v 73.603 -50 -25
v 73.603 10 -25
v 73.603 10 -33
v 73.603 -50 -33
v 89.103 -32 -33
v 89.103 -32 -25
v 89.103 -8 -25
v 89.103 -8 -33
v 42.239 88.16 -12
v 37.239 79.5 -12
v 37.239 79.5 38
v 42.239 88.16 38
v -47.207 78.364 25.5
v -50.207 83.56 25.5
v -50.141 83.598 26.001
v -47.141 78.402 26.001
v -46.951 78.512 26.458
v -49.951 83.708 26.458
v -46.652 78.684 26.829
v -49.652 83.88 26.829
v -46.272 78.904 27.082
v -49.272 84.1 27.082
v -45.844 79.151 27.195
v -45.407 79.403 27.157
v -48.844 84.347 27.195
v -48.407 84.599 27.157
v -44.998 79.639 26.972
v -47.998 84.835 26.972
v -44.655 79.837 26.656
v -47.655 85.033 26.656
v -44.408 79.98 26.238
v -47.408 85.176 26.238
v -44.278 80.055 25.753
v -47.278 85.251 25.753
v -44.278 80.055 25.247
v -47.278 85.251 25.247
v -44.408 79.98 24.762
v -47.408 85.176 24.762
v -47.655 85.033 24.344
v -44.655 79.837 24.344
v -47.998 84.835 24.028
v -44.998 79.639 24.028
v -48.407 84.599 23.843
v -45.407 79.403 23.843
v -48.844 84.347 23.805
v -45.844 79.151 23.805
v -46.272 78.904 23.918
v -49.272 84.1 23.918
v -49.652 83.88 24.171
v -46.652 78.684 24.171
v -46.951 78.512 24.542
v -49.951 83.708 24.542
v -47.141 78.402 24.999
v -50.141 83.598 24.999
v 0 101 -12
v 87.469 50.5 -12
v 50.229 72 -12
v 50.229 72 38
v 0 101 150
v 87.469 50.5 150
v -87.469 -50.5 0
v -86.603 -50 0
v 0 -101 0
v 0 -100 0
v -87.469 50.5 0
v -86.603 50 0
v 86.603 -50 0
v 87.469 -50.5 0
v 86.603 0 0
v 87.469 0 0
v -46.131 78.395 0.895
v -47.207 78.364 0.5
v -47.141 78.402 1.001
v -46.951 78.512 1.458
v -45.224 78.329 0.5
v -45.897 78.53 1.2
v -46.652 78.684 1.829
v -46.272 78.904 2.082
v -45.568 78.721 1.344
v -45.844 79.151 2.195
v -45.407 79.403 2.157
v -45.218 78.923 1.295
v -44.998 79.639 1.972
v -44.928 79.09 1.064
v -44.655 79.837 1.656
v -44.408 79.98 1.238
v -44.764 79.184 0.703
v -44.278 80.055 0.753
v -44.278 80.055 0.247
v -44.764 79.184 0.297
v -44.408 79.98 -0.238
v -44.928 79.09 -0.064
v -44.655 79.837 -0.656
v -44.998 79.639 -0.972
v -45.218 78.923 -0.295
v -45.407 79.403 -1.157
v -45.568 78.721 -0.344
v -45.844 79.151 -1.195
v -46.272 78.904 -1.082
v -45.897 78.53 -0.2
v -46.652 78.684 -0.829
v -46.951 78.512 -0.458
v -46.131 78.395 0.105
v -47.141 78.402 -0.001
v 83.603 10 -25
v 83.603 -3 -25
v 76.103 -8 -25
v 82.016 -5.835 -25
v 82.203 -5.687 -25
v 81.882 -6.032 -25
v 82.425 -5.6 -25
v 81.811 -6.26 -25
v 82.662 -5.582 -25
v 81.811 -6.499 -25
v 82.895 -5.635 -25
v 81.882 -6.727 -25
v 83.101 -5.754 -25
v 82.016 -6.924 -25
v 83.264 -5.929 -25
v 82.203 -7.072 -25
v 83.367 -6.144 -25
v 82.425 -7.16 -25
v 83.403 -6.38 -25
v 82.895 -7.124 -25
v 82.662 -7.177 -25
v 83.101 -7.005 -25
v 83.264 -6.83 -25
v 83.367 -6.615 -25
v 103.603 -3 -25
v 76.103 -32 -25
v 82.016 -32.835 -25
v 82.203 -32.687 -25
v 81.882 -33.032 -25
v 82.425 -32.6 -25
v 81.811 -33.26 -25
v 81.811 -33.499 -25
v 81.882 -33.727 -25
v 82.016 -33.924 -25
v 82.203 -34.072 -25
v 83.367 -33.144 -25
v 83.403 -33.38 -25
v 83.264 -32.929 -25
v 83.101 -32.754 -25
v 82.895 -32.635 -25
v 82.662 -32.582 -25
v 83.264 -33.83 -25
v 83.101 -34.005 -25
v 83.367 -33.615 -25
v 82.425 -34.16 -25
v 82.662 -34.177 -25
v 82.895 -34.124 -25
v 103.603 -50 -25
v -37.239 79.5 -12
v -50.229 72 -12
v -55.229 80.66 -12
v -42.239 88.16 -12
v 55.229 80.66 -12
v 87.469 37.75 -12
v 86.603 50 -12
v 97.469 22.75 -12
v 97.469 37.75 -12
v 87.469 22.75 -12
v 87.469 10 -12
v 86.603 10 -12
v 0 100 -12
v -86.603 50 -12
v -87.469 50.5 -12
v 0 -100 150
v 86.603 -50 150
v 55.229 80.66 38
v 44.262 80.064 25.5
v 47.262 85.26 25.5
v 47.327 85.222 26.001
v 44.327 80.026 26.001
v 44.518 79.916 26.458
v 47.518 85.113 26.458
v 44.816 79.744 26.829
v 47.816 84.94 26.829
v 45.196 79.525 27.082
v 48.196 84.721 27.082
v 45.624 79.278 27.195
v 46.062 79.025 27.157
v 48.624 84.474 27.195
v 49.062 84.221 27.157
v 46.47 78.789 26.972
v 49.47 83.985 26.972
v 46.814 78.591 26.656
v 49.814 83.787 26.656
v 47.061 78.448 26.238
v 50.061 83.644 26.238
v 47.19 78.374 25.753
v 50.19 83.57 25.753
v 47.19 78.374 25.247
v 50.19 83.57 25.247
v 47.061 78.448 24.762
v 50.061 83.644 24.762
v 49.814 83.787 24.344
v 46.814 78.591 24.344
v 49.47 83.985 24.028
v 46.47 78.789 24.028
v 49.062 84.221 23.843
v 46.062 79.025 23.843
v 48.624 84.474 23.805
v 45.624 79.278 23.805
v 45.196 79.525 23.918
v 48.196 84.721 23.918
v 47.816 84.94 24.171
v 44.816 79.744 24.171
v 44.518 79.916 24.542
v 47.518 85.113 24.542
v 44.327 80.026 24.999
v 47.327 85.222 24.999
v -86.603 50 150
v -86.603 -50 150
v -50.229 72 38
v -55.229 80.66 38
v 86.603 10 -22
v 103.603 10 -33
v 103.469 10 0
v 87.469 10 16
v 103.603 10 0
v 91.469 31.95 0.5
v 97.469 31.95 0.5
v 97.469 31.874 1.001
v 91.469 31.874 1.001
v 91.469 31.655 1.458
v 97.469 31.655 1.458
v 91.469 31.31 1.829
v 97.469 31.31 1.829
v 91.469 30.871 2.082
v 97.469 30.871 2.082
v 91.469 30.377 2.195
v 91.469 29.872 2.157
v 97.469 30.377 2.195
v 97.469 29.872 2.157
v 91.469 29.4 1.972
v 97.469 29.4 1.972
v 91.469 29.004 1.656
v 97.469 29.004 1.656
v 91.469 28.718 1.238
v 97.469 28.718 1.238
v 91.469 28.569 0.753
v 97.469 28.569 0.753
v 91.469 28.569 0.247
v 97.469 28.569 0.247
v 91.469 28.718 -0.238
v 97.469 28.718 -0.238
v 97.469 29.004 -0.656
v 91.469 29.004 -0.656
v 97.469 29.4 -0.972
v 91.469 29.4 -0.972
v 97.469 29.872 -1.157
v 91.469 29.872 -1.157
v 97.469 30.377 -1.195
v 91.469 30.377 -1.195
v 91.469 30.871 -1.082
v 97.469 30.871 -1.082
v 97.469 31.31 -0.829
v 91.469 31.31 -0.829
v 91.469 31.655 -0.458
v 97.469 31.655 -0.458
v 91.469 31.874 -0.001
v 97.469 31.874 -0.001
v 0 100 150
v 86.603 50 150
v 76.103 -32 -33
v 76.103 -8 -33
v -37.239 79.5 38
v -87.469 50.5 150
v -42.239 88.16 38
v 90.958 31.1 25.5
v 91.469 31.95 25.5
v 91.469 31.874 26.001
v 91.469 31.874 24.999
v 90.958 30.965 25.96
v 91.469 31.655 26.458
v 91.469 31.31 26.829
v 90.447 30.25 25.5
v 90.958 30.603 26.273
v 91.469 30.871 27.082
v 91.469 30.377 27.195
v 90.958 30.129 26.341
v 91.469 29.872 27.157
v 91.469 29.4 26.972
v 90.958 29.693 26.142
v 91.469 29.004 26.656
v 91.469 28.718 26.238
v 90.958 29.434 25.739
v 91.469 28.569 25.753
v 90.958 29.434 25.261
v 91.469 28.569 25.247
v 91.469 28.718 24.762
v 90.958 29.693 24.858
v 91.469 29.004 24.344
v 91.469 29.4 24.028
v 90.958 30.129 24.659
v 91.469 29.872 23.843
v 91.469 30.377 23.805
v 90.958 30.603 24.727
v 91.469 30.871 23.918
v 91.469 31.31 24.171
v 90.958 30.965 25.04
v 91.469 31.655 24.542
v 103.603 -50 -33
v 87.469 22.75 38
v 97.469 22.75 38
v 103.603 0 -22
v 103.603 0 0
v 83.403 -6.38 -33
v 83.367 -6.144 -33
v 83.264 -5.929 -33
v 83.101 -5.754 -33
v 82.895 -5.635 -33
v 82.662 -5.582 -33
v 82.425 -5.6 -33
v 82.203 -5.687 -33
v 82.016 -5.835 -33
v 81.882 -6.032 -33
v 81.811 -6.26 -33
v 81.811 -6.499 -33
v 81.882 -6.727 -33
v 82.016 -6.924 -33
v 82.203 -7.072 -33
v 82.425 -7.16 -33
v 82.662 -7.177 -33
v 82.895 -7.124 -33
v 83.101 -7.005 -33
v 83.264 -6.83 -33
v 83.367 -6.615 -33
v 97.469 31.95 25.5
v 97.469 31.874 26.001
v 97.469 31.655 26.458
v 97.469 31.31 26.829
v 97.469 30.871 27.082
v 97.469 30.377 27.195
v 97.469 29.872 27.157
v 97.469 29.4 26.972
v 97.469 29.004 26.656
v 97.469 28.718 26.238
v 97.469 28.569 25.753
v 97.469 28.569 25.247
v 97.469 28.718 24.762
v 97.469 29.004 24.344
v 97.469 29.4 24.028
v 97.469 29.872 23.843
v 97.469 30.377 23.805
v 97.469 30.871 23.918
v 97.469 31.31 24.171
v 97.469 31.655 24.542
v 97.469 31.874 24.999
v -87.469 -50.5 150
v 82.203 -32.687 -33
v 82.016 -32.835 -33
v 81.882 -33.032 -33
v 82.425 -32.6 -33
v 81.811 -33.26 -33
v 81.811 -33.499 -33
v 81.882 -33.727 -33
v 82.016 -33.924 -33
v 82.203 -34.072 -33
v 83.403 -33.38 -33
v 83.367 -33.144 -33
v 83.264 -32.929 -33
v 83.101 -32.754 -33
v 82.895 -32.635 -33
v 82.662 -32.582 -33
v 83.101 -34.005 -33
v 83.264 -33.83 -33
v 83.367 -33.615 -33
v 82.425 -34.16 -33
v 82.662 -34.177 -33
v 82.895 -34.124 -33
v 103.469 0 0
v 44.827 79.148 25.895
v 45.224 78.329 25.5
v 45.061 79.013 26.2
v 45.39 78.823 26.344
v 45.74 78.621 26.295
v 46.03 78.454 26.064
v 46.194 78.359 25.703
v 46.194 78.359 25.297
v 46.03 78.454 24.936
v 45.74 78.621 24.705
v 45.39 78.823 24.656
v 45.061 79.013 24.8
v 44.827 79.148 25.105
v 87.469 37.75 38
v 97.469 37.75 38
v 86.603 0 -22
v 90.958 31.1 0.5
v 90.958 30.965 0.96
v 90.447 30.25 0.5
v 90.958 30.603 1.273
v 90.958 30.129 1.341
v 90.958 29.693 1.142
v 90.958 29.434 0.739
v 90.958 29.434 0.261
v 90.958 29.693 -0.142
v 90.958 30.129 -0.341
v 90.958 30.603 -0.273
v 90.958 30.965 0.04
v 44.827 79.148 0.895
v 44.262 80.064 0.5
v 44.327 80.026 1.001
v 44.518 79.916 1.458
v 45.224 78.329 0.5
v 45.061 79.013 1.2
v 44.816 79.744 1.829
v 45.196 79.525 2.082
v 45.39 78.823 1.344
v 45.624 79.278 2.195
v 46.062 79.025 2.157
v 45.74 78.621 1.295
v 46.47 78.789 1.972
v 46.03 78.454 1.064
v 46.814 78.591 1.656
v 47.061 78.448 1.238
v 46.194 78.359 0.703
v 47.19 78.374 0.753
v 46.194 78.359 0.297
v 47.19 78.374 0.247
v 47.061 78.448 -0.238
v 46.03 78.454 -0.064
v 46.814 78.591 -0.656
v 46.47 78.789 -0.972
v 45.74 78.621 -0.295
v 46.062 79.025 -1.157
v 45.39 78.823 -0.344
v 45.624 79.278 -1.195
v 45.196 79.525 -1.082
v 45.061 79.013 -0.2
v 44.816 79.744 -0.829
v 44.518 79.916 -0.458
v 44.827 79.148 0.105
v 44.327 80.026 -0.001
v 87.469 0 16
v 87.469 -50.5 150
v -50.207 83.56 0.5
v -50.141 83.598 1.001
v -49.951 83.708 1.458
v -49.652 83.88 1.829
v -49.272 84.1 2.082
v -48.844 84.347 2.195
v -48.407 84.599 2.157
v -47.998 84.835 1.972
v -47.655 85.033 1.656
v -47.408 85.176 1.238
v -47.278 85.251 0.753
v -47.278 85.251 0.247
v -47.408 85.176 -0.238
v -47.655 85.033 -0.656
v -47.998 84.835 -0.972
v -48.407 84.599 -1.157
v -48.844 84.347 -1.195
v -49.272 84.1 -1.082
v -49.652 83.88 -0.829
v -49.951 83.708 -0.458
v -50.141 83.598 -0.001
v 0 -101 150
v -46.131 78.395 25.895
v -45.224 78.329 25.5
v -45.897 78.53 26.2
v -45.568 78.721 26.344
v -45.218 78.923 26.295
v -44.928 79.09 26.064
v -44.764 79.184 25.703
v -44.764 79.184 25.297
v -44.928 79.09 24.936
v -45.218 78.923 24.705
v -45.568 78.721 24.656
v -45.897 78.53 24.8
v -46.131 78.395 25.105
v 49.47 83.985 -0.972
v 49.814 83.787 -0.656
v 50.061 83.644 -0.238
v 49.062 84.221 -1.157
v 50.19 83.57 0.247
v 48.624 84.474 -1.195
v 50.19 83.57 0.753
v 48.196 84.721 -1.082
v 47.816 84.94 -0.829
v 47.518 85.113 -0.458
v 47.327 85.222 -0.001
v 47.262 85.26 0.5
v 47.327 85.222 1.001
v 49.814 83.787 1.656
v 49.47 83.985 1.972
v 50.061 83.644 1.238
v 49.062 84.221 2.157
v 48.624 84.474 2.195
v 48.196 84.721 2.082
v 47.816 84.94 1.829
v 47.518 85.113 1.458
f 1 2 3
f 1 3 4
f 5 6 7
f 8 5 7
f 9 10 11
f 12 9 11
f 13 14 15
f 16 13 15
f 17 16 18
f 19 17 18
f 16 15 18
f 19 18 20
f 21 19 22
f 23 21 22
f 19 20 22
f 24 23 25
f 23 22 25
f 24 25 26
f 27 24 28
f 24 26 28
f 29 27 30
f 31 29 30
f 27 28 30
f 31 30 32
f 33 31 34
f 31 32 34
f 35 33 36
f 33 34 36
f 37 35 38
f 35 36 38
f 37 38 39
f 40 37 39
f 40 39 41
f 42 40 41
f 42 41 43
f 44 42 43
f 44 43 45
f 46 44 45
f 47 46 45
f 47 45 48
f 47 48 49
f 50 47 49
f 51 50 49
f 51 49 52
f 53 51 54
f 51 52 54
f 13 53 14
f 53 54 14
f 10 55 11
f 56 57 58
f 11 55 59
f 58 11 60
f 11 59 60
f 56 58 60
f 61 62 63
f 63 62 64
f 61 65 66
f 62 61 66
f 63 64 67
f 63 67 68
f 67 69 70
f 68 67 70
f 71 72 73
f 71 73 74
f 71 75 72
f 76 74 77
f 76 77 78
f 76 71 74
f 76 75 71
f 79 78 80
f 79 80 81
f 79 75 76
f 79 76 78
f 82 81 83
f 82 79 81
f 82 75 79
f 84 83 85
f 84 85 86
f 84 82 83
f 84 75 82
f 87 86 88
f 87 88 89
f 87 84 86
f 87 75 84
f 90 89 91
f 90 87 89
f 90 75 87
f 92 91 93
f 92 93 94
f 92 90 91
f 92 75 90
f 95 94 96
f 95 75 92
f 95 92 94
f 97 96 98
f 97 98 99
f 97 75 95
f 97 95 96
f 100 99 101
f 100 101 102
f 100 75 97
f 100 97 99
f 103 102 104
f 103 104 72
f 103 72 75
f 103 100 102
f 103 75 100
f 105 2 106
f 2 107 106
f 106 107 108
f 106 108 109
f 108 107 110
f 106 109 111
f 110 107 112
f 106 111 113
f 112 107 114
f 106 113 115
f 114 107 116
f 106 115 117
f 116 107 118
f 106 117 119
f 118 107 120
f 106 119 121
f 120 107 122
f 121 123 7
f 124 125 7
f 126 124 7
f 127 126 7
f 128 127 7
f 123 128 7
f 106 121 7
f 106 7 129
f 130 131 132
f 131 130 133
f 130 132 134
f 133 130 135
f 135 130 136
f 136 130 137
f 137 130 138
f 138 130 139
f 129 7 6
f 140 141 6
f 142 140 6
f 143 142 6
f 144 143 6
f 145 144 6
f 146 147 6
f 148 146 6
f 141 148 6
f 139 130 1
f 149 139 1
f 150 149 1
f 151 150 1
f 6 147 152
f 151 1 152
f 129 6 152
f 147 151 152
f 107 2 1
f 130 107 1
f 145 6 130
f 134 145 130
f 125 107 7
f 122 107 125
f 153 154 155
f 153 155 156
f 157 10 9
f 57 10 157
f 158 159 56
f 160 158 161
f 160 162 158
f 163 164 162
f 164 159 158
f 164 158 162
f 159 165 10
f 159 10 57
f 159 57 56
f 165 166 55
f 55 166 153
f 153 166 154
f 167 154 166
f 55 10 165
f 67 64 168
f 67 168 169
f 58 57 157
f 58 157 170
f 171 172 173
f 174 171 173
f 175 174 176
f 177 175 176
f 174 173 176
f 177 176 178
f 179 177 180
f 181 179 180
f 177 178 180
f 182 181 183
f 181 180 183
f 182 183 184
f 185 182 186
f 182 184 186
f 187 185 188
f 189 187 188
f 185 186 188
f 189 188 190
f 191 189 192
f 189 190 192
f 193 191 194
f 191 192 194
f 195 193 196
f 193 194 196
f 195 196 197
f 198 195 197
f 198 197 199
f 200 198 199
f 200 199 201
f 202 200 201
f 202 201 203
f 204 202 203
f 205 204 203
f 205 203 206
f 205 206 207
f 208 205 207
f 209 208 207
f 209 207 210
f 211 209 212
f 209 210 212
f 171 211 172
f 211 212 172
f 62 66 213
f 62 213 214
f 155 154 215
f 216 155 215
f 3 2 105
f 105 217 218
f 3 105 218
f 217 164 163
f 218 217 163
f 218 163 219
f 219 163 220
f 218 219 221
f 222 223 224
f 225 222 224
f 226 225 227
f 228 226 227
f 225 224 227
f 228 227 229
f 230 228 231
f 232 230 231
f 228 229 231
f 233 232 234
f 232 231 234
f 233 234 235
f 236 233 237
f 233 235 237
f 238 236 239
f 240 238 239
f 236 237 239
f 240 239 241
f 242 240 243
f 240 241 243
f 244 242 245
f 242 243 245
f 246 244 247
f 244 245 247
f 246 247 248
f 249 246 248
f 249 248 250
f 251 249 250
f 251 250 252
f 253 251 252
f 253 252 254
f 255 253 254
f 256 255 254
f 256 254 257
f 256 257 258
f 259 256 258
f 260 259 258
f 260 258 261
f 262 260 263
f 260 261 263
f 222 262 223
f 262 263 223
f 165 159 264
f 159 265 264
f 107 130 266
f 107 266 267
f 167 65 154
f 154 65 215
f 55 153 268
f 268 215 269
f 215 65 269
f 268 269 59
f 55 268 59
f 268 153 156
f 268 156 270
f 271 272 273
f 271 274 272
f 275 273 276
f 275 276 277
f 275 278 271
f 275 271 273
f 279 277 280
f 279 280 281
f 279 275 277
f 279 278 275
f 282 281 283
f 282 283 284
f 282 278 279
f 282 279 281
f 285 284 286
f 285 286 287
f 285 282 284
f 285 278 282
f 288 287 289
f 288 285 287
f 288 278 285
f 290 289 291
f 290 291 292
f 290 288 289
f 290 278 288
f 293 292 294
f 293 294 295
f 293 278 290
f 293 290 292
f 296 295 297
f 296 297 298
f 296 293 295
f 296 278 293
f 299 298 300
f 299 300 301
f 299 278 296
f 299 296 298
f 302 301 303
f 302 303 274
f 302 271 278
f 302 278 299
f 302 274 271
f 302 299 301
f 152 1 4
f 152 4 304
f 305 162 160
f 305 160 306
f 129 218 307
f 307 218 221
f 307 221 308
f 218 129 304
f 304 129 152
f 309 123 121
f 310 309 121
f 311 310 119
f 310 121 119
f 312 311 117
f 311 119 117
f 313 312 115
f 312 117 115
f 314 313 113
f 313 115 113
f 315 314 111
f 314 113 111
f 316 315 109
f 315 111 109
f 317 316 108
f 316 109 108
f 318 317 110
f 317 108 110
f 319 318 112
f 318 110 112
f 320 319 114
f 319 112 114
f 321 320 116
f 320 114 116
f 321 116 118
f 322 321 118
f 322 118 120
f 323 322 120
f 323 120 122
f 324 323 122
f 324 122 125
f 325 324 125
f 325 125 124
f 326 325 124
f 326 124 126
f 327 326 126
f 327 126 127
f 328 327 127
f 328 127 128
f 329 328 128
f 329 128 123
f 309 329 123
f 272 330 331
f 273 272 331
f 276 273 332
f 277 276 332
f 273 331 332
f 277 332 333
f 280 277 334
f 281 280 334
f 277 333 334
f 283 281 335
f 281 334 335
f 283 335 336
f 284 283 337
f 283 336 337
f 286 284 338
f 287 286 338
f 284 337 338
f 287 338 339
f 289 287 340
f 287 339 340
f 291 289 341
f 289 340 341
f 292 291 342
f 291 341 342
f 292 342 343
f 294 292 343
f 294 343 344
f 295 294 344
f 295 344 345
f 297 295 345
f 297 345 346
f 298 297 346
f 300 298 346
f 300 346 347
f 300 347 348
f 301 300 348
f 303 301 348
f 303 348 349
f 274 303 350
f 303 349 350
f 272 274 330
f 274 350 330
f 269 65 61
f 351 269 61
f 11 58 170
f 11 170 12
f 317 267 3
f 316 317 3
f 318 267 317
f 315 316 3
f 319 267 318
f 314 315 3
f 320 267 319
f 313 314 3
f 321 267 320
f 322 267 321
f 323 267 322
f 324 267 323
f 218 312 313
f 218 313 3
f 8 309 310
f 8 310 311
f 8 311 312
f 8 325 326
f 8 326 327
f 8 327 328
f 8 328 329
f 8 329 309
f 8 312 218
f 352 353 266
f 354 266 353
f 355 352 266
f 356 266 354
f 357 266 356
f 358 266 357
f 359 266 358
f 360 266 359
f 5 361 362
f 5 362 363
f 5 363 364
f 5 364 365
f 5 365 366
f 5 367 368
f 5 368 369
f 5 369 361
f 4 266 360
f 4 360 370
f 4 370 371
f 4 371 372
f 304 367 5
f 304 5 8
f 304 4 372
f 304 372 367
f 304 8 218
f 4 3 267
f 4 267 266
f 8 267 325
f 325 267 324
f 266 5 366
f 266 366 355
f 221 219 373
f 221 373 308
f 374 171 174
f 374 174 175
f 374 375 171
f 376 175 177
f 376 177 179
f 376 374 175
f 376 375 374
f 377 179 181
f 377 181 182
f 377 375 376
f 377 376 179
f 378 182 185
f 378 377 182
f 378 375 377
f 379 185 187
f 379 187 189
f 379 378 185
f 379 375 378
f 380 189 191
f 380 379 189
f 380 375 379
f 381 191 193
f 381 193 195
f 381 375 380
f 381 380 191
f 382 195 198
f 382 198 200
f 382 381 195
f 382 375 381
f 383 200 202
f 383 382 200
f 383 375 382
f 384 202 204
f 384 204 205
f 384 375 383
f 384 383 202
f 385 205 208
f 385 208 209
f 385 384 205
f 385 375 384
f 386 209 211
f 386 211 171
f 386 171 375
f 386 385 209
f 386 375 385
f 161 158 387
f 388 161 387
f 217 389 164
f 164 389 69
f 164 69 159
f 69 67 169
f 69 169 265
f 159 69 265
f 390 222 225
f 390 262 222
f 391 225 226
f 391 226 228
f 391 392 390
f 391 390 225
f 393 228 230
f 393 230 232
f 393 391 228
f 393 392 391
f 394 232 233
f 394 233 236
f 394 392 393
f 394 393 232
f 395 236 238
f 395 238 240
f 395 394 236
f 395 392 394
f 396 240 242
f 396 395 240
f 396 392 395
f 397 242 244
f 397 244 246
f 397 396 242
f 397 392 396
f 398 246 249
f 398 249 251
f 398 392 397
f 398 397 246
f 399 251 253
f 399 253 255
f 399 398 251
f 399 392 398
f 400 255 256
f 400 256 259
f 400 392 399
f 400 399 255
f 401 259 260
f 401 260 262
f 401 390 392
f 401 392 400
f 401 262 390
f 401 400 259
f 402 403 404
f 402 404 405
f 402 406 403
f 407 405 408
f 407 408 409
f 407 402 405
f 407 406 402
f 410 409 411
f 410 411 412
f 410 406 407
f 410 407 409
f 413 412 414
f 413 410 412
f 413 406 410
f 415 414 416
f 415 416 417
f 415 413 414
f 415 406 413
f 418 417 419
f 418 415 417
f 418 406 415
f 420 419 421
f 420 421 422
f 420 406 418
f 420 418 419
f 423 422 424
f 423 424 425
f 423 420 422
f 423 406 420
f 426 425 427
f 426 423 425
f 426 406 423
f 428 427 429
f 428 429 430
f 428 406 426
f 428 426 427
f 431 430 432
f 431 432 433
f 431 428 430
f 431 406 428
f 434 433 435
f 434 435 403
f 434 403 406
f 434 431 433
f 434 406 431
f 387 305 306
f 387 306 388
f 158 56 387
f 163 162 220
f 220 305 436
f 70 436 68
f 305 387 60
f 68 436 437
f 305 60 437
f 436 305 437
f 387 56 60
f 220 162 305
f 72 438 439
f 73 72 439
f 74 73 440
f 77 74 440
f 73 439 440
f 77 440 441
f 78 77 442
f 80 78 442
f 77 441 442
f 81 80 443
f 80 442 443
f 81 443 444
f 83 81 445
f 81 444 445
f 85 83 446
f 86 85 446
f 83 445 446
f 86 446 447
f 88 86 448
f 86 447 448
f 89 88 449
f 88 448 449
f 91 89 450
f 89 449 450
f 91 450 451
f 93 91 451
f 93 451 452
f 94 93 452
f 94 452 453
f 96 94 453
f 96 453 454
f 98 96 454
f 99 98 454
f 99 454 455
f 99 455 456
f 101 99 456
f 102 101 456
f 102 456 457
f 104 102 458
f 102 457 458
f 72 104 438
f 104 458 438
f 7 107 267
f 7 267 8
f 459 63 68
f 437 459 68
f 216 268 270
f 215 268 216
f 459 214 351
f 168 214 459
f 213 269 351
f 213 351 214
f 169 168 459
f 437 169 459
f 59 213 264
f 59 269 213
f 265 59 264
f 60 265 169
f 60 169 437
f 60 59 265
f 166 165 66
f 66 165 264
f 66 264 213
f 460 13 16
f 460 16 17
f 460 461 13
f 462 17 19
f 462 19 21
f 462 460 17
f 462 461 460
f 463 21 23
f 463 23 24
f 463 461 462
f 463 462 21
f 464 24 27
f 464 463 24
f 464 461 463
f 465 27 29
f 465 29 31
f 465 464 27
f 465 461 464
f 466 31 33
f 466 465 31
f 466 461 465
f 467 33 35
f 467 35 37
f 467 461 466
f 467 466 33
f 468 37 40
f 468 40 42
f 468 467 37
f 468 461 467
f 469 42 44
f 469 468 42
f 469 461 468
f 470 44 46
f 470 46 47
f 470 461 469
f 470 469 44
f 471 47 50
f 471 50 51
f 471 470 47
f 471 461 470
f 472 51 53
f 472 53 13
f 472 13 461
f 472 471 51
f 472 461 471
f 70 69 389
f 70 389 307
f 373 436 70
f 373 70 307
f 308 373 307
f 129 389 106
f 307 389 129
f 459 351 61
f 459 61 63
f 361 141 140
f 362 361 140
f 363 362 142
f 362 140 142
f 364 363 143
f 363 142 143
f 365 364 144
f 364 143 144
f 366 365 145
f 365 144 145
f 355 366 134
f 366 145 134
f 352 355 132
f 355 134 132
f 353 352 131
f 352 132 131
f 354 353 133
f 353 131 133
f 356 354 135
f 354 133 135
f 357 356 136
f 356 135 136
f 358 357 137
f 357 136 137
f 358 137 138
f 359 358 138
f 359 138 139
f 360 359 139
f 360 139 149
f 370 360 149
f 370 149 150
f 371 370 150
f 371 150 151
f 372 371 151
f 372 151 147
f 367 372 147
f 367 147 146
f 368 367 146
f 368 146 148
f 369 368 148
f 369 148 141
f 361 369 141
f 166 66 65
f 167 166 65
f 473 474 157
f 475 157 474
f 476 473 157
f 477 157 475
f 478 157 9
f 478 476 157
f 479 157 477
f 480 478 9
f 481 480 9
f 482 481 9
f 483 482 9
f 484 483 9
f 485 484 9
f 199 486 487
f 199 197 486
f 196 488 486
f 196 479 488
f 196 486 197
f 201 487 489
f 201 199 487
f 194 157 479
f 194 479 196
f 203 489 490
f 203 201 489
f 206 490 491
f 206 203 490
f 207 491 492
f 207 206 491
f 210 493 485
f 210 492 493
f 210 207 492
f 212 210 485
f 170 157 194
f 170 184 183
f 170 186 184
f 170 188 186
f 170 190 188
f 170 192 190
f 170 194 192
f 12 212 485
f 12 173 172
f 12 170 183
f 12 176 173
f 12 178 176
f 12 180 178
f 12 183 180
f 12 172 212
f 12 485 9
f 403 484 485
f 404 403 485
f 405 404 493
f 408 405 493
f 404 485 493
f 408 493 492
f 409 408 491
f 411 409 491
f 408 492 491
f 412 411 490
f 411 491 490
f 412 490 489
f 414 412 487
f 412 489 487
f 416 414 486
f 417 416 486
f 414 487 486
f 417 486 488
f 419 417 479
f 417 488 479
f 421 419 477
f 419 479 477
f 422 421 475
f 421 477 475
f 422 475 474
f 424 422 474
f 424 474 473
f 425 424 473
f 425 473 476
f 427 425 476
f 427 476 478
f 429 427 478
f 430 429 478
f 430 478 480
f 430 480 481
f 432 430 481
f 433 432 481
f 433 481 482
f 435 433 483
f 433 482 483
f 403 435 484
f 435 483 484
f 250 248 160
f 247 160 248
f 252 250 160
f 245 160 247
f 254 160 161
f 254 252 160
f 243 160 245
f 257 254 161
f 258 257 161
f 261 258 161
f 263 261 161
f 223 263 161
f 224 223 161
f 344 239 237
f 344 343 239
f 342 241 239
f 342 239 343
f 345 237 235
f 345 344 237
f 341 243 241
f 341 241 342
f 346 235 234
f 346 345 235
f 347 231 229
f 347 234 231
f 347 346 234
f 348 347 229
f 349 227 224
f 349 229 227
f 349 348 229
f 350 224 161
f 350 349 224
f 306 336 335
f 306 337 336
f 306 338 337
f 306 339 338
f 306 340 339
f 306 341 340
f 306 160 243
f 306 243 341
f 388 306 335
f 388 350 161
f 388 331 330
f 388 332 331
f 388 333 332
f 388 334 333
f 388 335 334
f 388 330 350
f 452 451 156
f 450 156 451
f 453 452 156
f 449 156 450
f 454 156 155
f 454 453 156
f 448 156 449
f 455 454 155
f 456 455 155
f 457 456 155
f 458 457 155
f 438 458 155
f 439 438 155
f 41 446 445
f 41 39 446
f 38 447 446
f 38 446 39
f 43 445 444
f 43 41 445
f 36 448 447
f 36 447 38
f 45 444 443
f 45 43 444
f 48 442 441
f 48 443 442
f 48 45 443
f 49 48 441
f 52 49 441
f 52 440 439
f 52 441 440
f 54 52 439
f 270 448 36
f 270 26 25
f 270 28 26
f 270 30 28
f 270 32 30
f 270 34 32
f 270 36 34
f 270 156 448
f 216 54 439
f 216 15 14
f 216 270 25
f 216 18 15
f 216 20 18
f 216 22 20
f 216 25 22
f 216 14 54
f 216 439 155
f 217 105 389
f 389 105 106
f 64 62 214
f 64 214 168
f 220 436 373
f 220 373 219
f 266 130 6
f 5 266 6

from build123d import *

# Parameters (mm, degrees)
PAD_DEPTH       = 150
SKETCH001_W     = 17
SKETCH001_H     = 10
PAD001_DEPTH    = 25
SKETCH002_W     = 30
SKETCH002_H     = 60
PAD002_DEPTH    = 8
SKETCH003_W     = 13
SKETCH003_H     = 24
POCKET_DEPTH    = 8.001
SKETCH004_R     = 0.8
HOLE_DEPTH      = 25
CHAMFER_SIZE    = 16
CHAMFER001_SIZE = 3
PAD003_DEPTH    = 12
SKETCH006_W     = 15
SKETCH006_H     = 50
PAD004_DEPTH    = 10
SKETCH007_R     = 1.7
HOLE001_DEPTH   = 6
HOLE001_TIPS_R  = 1.7
SKETCH008_W     = 15
SKETCH008_H     = 50
PAD005_DEPTH    = 10
SKETCH009_R     = 1.7
HOLE002_DEPTH   = 6
HOLE002_TIPS_R  = 1.7
SKETCH010_W     = 15
SKETCH010_H     = 50
PAD006_DEPTH    = 10
SKETCH011_R     = 1.7
HOLE003_DEPTH   = 6
HOLE003_TIPS_R  = 1.7


with BuildPart() as part:
    # Sketch → Pad (new body)
    with BuildSketch(Plane.XY):
        Polygon((87.4685657822, -50.5), (87.4685657822, 50.5), (0, 101), (-87.4685657822, 50.5), (-87.4685657822, -50.5), (0, -101), align=None)
        Polygon((86.6025403784, 50), (0, 100), (-86.6025403784, 50), (-86.6025403784, -50), (0, -100), (86.6025403784, -50), align=None, mode=Mode.SUBTRACT)
    extrude(amount=PAD_DEPTH)

    # Sketch001 (on Face13 of Pad) → Pad001 (join)
    with BuildSketch(Plane(origin=(0, 0, 0), x_dir=(1, 0, 0), z_dir=(0, 0, -1))):
        with Locations((95.1025403784, -5)):
            Rectangle(SKETCH001_W, SKETCH001_H)
    extrude(amount=PAD001_DEPTH)

    # Sketch002 (on Face20 of Pad001) → Pad002 (join)
    with BuildSketch(Plane(origin=(0, 0, -25), x_dir=(1, 0, 0), z_dir=(0, 0, -1))):
        with Locations((88.6025403784, 20)):
            Rectangle(SKETCH002_W, SKETCH002_H)
    extrude(amount=PAD002_DEPTH)

    # Sketch003 (on Face21 of Pad002) → Pocket (cut, through all)
    with BuildSketch(Plane.XY.offset(-25)):
        with Locations((82.6025403784, -20)):
            Rectangle(SKETCH003_W, SKETCH003_H)
    extrude(amount=-POCKET_DEPTH, mode=Mode.SUBTRACT)

    # Sketch004 (on Face21 of Pocket) → Hole (cut)
    with BuildSketch(Plane.XY.offset(-25)):
        with Locations((82.6025403784, -6.379604)):
            Circle(SKETCH004_R)
        with Locations((82.6025403784, -33.379604)):
            Circle(SKETCH004_R)
    extrude(amount=-HOLE_DEPTH, mode=Mode.SUBTRACT)

    # Chamfer
    chamfer_edges = [part.edges().sort_by_distance(p)[0] for p in [
        (87.468566, 5, 0),
    ]]
    chamfer(chamfer_edges, length=CHAMFER_SIZE)

    # Chamfer001
    chamfer001_edges = [part.edges().sort_by_distance(p)[0] for p in [
        (95.10254, 0, -25),
        (86.60254, 5, -25),
    ]]
    chamfer(chamfer001_edges, length=CHAMFER001_SIZE)

    # Sketch005 (on Face7 of Chamfer001) → Pad003 (join)
    with BuildSketch(Plane(origin=(0, 0, 0), x_dir=(1, 0, 0), z_dir=(0, 0, -1))):
        Polygon((86.6025403784, -10), (86.6025403784, -50), (0, -100), (-86.6025403784, -50), (-87.4685657822, -50.5), (0, -101), (87.4685657822, -50.5), (87.4685657822, -10), align=None)
    extrude(amount=PAD003_DEPTH)

    # Sketch006 (on Face23 of Pad003) → Pad004 (join)
    with BuildSketch(Plane.YZ.offset(87.4685657822)):
        with Locations((30.25, 13)):
            Rectangle(SKETCH006_W, SKETCH006_H)
    extrude(amount=PAD004_DEPTH)

    # Sketch007 (on Face47 of Pad004) → Hole001 (cut)
    with BuildSketch(Plane.YZ.offset(97.4685657822)):
        with Locations((30.25, 25.5)):
            Circle(SKETCH007_R)
        with Locations((30.25, 0.5)):
            Circle(SKETCH007_R)
    extrude(amount=-HOLE001_DEPTH, mode=Mode.SUBTRACT)

    # Hole001 tips → Hole001 tip 1 section 0
    with BuildSketch(Plane.YZ.offset(91.4685657822), mode=Mode.PRIVATE) as hole001_tip_1_s0:
        with Locations((30.25, 25.5)):
            Circle(HOLE001_TIPS_R)
    loft([hole001_tip_1_s0.sketch, Vertex(90.4471027299, 30.25, 25.5)], mode=Mode.SUBTRACT)

    # Hole001 tips → Hole001 tip 2 section 0
    with BuildSketch(Plane.YZ.offset(91.4685657822), mode=Mode.PRIVATE) as hole001_tip_2_s0:
        with Locations((30.25, 0.5)):
            Circle(HOLE001_TIPS_R)
    loft([hole001_tip_2_s0.sketch, Vertex(90.4471027299, 30.25, 0.5)], mode=Mode.SUBTRACT)

    # Sketch008 (on Face48 of Hole001) → Pad005 (join)
    with BuildSketch(Plane(origin=(43.7342828911, 75.75, 0), x_dir=(-0.8660254038, 0.5, 0), z_dir=(0.5, 0.8660254038, 0))):
        with Locations((0, 13)):
            Rectangle(SKETCH008_W, SKETCH008_H)
    extrude(amount=PAD005_DEPTH)

    # Sketch009 (on Face56 of Pad005) → Hole002 (cut)
    with BuildSketch(Plane(origin=(48.7342828911, 84.4102540378, 0), x_dir=(-0.8660254038, 0.5, 0), z_dir=(0.5, 0.8660254038, 0))):
        with Locations((0, 25.5)):
            Circle(SKETCH009_R)
        with Locations((0, 0.5)):
            Circle(SKETCH009_R)
    extrude(amount=-HOLE002_DEPTH, mode=Mode.SUBTRACT)

    # Hole002 tips → Hole002 tip 1 section 0
    with BuildSketch(Plane(origin=(45.7342828911, 79.2141016151, 0), x_dir=(-0.8660254038, 0.5, 0), z_dir=(0.5, 0.8660254038, 0)), mode=Mode.PRIVATE) as hole002_tip_1_s0:
        with Locations((0, 25.5)):
            Circle(HOLE002_TIPS_R)
    loft([hole002_tip_1_s0.sketch, Vertex(45.2235513649, 78.3294886628, 25.5)], mode=Mode.SUBTRACT)

    # Hole002 tips → Hole002 tip 2 section 0
    with BuildSketch(Plane(origin=(45.7342828911, 79.2141016151, 0), x_dir=(-0.8660254038, 0.5, 0), z_dir=(0.5, 0.8660254038, 0)), mode=Mode.PRIVATE) as hole002_tip_2_s0:
        with Locations((0, 0.5)):
            Circle(HOLE002_TIPS_R)
    loft([hole002_tip_2_s0.sketch, Vertex(45.2235513649, 78.3294886628, 0.5)], mode=Mode.SUBTRACT)

    # Sketch010 (on Face44 of Hole002) → Pad006 (join)
    with BuildSketch(Plane(origin=(-43.7342828911, 75.75, 0), x_dir=(-0.8660254038, -0.5, 0), z_dir=(-0.5, 0.8660254038, 0))):
        with Locations((0, 13)):
            Rectangle(SKETCH010_W, SKETCH010_H)
    extrude(amount=PAD006_DEPTH)

    # Sketch011 (on Face62 of Pad006) → Hole003 (cut)
    with BuildSketch(Plane(origin=(-48.7342828911, 84.4102540378, 0), x_dir=(-0.8660254038, -0.5, 0), z_dir=(-0.5, 0.8660254038, 0))):
        with Locations((0, 25.5)):
            Circle(SKETCH011_R)
        with Locations((0, 0.5)):
            Circle(SKETCH011_R)
    extrude(amount=-HOLE003_DEPTH, mode=Mode.SUBTRACT)

    # Hole003 tips → Hole003 tip 1 section 0
    with BuildSketch(Plane(origin=(-45.7342828911, 79.2141016151, 0), x_dir=(-0.8660254038, -0.5, 0), z_dir=(-0.5, 0.8660254038, 0)), mode=Mode.PRIVATE) as hole003_tip_1_s0:
        with Locations((0, 25.5)):
            Circle(HOLE003_TIPS_R)
    loft([hole003_tip_1_s0.sketch, Vertex(-45.2235513649, 78.3294886628, 25.5)], mode=Mode.SUBTRACT)

    # Hole003 tips → Hole003 tip 2 section 0
    with BuildSketch(Plane(origin=(-45.7342828911, 79.2141016151, 0), x_dir=(-0.8660254038, -0.5, 0), z_dir=(-0.5, 0.8660254038, 0)), mode=Mode.PRIVATE) as hole003_tip_2_s0:
        with Locations((0, 0.5)):
            Circle(HOLE003_TIPS_R)
    loft([hole003_tip_2_s0.sketch, Vertex(-45.2235513649, 78.3294886628, 0.5)], mode=Mode.SUBTRACT)


solid = part.part
